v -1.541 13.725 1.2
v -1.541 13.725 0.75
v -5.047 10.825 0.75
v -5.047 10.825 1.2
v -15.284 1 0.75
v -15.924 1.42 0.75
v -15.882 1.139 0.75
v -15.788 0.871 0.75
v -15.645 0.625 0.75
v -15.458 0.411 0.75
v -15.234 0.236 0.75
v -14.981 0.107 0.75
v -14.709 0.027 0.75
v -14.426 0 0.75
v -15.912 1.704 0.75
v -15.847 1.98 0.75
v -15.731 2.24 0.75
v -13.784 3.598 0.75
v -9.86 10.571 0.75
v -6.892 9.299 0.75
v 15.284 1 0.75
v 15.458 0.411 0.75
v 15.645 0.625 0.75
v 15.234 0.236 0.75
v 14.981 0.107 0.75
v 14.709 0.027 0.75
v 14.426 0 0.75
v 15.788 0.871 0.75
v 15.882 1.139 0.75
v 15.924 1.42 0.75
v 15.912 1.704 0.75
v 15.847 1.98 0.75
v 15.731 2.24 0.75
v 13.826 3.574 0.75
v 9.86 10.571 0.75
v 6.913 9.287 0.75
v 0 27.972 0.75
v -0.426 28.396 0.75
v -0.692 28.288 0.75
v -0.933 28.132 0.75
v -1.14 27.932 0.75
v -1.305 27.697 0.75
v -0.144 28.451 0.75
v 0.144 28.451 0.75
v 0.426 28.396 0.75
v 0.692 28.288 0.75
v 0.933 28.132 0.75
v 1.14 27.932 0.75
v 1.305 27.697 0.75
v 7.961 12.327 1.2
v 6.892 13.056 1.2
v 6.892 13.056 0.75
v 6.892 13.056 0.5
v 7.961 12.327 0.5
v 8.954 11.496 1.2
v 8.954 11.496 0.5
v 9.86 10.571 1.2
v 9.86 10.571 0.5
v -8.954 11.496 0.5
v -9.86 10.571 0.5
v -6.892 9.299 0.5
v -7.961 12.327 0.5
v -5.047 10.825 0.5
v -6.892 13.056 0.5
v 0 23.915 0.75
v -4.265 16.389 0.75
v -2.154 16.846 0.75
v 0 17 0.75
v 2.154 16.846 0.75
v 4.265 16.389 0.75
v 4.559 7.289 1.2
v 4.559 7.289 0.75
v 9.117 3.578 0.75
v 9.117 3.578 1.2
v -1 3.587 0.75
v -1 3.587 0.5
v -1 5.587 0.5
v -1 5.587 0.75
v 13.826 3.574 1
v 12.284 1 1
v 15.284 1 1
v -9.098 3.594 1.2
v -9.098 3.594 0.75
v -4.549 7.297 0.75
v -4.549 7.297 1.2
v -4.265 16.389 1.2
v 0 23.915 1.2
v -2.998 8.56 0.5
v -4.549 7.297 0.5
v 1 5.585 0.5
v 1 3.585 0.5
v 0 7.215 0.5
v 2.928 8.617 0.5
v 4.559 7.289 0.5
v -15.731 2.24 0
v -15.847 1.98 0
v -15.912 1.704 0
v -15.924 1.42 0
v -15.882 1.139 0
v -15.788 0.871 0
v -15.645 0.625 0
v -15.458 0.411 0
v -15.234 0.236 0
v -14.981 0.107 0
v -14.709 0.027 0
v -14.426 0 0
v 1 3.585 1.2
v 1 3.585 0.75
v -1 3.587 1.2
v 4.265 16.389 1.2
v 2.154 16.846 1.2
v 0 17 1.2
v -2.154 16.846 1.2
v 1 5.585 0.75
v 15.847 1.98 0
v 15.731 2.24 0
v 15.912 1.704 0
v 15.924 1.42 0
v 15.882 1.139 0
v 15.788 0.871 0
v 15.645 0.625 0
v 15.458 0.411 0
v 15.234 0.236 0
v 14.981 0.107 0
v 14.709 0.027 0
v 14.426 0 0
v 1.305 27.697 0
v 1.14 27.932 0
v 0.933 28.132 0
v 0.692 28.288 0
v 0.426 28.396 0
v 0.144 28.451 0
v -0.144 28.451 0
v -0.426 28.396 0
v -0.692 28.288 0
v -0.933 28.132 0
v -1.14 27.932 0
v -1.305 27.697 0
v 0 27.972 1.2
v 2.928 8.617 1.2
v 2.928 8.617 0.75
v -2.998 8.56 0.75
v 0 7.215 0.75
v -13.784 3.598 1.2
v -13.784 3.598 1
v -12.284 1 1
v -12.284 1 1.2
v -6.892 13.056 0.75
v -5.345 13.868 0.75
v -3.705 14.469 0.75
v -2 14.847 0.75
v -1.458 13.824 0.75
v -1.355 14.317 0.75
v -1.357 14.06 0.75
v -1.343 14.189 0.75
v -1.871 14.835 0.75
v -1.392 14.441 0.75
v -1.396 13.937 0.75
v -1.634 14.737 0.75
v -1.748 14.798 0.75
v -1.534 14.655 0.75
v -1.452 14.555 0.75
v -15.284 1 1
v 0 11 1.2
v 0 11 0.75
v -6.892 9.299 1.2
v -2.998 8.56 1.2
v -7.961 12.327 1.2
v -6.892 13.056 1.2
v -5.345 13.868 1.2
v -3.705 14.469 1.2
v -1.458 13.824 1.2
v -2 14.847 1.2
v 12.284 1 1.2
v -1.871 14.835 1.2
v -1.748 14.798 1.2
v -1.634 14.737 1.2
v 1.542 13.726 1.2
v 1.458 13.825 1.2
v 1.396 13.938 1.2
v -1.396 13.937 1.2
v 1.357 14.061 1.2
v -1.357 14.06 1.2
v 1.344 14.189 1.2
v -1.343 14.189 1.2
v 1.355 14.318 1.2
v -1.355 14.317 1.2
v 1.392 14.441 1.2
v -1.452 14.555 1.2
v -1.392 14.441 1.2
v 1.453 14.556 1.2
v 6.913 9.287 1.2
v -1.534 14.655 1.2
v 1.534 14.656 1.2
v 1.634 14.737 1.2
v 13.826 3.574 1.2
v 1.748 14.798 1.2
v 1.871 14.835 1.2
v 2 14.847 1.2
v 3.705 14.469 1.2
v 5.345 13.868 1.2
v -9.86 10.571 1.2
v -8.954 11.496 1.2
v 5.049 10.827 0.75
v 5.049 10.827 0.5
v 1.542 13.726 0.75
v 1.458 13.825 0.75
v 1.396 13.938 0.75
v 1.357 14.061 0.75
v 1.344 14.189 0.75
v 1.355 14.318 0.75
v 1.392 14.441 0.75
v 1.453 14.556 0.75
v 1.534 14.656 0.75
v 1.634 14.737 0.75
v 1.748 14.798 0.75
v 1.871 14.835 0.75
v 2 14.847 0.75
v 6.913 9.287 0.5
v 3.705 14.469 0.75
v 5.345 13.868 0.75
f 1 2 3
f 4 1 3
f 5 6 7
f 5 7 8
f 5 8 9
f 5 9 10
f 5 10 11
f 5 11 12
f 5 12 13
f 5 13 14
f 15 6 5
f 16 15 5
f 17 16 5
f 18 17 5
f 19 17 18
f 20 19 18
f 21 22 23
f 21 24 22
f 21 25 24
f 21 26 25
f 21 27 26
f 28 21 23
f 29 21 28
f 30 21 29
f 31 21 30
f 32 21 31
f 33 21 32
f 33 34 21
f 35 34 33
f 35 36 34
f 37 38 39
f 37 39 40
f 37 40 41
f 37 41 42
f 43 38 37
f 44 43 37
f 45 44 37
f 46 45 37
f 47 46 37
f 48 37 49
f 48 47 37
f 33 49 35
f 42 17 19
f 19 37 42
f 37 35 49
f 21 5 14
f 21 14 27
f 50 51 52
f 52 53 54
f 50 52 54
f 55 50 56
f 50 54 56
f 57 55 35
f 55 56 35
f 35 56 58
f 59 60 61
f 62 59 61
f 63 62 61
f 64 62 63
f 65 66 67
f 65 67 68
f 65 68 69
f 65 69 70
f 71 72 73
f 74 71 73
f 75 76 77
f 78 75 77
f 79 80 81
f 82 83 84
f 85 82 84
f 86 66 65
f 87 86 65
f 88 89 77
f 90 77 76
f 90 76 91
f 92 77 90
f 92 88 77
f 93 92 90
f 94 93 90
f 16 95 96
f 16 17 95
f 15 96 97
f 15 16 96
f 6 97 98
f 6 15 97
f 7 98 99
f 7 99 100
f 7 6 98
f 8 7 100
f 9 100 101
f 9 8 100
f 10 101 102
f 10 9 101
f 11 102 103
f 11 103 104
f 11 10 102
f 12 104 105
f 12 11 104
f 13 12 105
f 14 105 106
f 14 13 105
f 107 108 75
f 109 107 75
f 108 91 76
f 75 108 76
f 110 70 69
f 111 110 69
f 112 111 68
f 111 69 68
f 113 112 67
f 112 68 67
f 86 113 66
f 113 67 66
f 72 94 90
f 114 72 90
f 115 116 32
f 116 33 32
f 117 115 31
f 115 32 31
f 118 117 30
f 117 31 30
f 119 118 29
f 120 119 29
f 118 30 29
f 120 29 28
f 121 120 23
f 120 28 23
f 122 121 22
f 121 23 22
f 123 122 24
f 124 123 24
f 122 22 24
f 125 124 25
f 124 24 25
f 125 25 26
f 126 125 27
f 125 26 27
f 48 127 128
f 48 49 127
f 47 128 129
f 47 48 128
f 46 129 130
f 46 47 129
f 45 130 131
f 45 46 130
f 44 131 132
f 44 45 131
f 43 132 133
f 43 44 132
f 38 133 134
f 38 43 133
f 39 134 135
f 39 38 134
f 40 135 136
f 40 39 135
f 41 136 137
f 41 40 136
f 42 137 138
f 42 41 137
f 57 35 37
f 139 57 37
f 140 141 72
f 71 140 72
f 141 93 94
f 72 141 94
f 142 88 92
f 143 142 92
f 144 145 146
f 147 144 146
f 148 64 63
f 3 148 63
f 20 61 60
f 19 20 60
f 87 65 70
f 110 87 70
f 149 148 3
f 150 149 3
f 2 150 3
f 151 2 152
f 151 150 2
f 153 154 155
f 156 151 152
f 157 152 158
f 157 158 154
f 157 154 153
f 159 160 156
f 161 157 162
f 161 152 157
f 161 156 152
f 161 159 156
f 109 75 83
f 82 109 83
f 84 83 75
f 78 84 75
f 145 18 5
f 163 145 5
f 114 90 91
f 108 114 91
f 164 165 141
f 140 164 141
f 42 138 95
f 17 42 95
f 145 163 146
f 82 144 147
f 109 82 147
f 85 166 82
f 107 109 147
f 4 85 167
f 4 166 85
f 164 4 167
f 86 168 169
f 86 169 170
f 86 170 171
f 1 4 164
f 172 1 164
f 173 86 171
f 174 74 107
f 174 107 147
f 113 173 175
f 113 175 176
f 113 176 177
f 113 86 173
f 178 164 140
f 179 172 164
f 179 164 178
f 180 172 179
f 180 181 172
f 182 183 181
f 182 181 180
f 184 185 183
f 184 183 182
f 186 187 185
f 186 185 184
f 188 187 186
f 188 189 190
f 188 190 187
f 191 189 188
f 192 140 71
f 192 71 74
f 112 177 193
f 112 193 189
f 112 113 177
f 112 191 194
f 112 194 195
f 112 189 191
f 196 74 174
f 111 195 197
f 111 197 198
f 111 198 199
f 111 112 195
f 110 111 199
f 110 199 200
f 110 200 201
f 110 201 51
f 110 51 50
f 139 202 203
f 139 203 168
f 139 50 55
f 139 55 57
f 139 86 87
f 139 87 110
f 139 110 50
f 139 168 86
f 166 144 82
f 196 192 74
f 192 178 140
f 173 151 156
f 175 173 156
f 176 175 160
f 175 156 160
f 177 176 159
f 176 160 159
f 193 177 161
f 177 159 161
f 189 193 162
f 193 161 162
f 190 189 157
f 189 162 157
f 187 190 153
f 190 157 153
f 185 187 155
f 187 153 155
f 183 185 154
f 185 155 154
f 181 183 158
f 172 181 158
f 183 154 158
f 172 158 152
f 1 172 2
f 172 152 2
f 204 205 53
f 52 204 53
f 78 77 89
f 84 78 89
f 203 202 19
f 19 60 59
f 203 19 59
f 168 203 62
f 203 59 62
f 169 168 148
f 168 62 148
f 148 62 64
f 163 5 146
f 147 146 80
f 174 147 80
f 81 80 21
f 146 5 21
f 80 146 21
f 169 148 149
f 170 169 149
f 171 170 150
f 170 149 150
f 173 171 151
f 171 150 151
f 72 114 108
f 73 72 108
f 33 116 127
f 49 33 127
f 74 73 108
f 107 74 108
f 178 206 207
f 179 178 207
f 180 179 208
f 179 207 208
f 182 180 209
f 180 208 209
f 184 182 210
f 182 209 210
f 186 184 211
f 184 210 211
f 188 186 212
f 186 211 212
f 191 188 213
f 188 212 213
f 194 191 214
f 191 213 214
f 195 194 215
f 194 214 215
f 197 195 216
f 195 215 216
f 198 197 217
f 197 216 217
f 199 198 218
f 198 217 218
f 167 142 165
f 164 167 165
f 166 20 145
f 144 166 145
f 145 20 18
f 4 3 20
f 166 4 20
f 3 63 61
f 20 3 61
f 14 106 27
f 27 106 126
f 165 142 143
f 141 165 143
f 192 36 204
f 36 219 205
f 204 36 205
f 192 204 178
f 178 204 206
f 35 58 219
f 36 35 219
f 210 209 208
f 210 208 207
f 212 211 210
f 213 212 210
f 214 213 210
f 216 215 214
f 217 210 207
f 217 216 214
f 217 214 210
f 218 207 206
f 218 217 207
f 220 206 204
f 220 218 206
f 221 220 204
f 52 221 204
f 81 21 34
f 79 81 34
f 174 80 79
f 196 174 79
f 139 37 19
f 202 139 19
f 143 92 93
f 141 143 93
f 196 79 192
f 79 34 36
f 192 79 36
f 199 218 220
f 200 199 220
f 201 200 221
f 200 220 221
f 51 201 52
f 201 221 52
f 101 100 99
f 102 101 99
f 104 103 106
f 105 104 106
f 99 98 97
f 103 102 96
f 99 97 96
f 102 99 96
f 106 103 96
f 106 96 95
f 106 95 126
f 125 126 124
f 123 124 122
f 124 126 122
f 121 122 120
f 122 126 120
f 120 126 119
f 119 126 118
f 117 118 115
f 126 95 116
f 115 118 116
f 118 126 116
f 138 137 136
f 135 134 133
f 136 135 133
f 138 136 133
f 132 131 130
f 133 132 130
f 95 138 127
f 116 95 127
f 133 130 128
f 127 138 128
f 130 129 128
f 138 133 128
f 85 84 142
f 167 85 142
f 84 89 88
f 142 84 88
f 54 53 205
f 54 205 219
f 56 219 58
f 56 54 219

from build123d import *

# Parameters (mm, degrees)
F1_DEPTH = 0.75
F2_DEPTH = 1.2
F3_DEPTH = 0.5
F4_R     = 1.5
F5_DEPTH = 1


with BuildPart() as f1:
    # F0 (on Top) → F1 (new body)
    with BuildSketch(Plane.XY):
        Polygon((17, 0), (0, 30), (-17, 0), align=None)
        Polygon((-9.8602514396, 10.5712104419), (0, 27.9716541589), (9.8602514396, 10.5712104419), (6.91278449, 9.2867956266), (13.8255689799, 3.5735912532), (15.2839373567, 1), (12.2839373567, 1), (-12.2839373567, 1), (-15.2839373567, 1), (-13.7839373567, 3.5980762114), (-6.8919686783, 9.2990381057), align=None, mode=Mode.SUBTRACT)
    extrude(amount=F1_DEPTH)



with BuildPart() as f1b:
    # F0 (on Top) → F1, piece 2 (new body)
    with BuildSketch(Plane.XY):
        with BuildLine():
            Line((4.2646633267, 16.3890860177), (0, 23.9149624766))
            Line((0, 23.9149624766), (-4.2646633267, 16.3890860177))
            ThreePointArc((-4.2646633267, 16.3890860177), (0, 17), (4.2646633267, 16.3890860177))
        make_face()
    extrude(amount=F1_DEPTH)


with BuildPart() as f1c:
    # F0 (on Top) → F1, piece 3 (new body)
    with BuildSketch(Plane.XY):
        with BuildLine():
            ThreePointArc((-2, 14.8474978515), (-4.53528859, 14.1958216086), (-6.8919686783, 13.0563352674))
            Line((-6.8919686783, 13.0563352674), (-5.0466307357, 10.8254816785))
            Line((-5.0466307357, 10.8254816785), (-1.5410891317, 13.7252277505))
            ThreePointArc((-1.5410891317, 13.7252277505), (-1.3920172008, 14.4411475731), (-2, 14.8474978515))
        make_face()
    extrude(amount=F1_DEPTH)


with BuildPart() as f1d:
    # F0 (on Top) → F1, piece 4 (new body)
    with BuildSketch(Plane.XY):
        with BuildLine():
            Line((5.049368775, 10.8268515661), (6.8919686783, 13.0563352674))
            ThreePointArc((6.8919686783, 13.0563352674), (4.53528859, 14.1958216086), (2, 14.8474978515))
            ThreePointArc((2, 14.8474978515), (1.3921371588, 14.4414464477), (1.5416340213, 13.7258867616))
            Line((1.5416340213, 13.7258867616), (5.049368775, 10.8268515661))
        make_face()
    extrude(amount=F1_DEPTH)


with BuildPart() as f1e:
    # F0 (on Top) → F1, piece 5 (new body)
    with BuildSketch(Plane.XY):
        Polygon((0, 11), (-2.997756418, 8.5596127439), (0, 7.2146742605), (2.927840303, 8.6165294417), align=None)
    extrude(amount=F1_DEPTH)


with BuildPart() as f1f:
    # F0 (on Top) → F1, piece 6 (new body)
    with BuildSketch(Plane.XY):
        Polygon((-4.5487910115, 7.2969601038), (-9.097582023, 3.5939202075), (-1, 3.5867390231), (-1, 5.5867390231), align=None)
    extrude(amount=F1_DEPTH)


with BuildPart() as f1g:
    # F0 (on Top) → F1, piece 7 (new body)
    with BuildSketch(Plane.XY):
        Polygon((1, 5.5849653616), (1, 3.5849653616), (9.117425038, 3.5777665798), (4.558712519, 7.2888832899), align=None)
    extrude(amount=F1_DEPTH)


with BuildPart() as f1_1:
    add(f1.part)

    add(f1b.part)  # F2 merges F1b

    add(f1c.part)  # F2 merges F1c

    add(f1d.part)  # F2 merges F1d

    add(f1e.part)  # F2 merges F1e

    add(f1f.part)  # F2 merges F1f

    add(f1g.part)  # F2 merges F1g
    # F0 (on Top) → F2 (join)
    with BuildSketch(Plane.XY):
        with BuildLine():
            Line((9.8602514396, 10.5712104419), (0, 27.9716541589))
            Line((0, 27.9716541589), (-9.8602514396, 10.5712104419))
            ThreePointArc((-9.8602514396, 10.5712104419), (-8.467773088, 11.9232570085), (-6.8919686783, 13.0563352674))
            ThreePointArc((-6.8919686783, 13.0563352674), (-4.53528859, 14.1958216086), (-2, 14.8474978515))
            ThreePointArc((-2, 14.8474978515), (-1.3920172008, 14.4411475731), (-1.5410891317, 13.7252277505))
            Line((-1.5410891317, 13.7252277505), (-5.0466307357, 10.8254816785))
            Line((-5.0466307357, 10.8254816785), (-6.8919686783, 9.2990381057))
            Line((-6.8919686783, 9.2990381057), (-13.7839373567, 3.5980762114))
            Line((-13.7839373567, 3.5980762114), (-12.2839373567, 1))
            Line((-12.2839373567, 1), (12.2839373567, 1))
            Line((12.2839373567, 1), (13.8255689799, 3.5735912532))
            Line((13.8255689799, 3.5735912532), (6.91278449, 9.2867956266))
            Line((6.91278449, 9.2867956266), (5.049368775, 10.8268515661))
            Line((5.049368775, 10.8268515661), (1.5416340213, 13.7258867616))
            ThreePointArc((1.5416340213, 13.7258867616), (1.3921371588, 14.4414464477), (2, 14.8474978515))
            ThreePointArc((2, 14.8474978515), (4.53528859, 14.1958216086), (6.8919686783, 13.0563352674))
            ThreePointArc((6.8919686783, 13.0563352674), (8.467773088, 11.9232570085), (9.8602514396, 10.5712104419))
        make_face()
        Polygon((-1, 3.5867390231), (-9.097582023, 3.5939202075), (-4.5487910115, 7.2969601038), (-2.997756418, 8.5596127439), (0, 11), (2.927840303, 8.6165294417), (4.558712519, 7.2888832899), (9.117425038, 3.5777665798), (1, 3.5849653616), align=None, mode=Mode.SUBTRACT)
        with BuildLine():
            Line((-4.2646633267, 16.3890860177), (0, 23.9149624766))
            Line((0, 23.9149624766), (4.2646633267, 16.3890860177))
            ThreePointArc((4.2646633267, 16.3890860177), (0, 17), (-4.2646633267, 16.3890860177))
        make_face(mode=Mode.SUBTRACT)
    extrude(amount=F2_DEPTH)

    # F0 (on Top) → F3 (join)
    with BuildSketch(Plane.XY):
        with BuildLine():
            ThreePointArc((-6.8919686783, 13.0563352674), (-8.467773088, 11.9232570085), (-9.8602514396, 10.5712104419))
            Line((-9.8602514396, 10.5712104419), (-6.8919686783, 9.2990381057))
            Line((-6.8919686783, 9.2990381057), (-5.0466307357, 10.8254816785))
            Line((-5.0466307357, 10.8254816785), (-6.8919686783, 13.0563352674))
        make_face()
        Polygon((-1, 5.5867390231), (-1, 3.5867390231), (1, 3.5849653616), (1, 5.5849653616), (4.558712519, 7.2888832899), (2.927840303, 8.6165294417), (0, 7.2146742605), (-2.997756418, 8.5596127439), (-4.5487910115, 7.2969601038), align=None)
        with BuildLine():
            Line((6.91278449, 9.2867956266), (9.8602514396, 10.5712104419))
            ThreePointArc((9.8602514396, 10.5712104419), (8.467773088, 11.9232570085), (6.8919686783, 13.0563352674))
            Line((6.8919686783, 13.0563352674), (5.049368775, 10.8268515661))
            Line((5.049368775, 10.8268515661), (6.91278449, 9.2867956266))
        make_face()
    extrude(amount=F3_DEPTH)

    # F4
    f4_edges = [f1_1.edges().sort_by_distance(p)[0] for p in [
        (0, 30, 0.375),
        (-17, 0, 0.375),
        (17, 0, 0.375),
    ]]
    fillet(f4_edges, radius=F4_R)

    # F0 (on Top) → F5 (join)
    with BuildSketch(Plane.XY):
        Polygon((-12.2839373567, 1), (-13.7839373567, 3.5980762114), (-15.2839373567, 1), align=None)
        Polygon((15.2839373567, 1), (13.8255689799, 3.5735912532), (12.2839373567, 1), align=None)
    extrude(amount=F5_DEPTH)


solid = f1_1.part
